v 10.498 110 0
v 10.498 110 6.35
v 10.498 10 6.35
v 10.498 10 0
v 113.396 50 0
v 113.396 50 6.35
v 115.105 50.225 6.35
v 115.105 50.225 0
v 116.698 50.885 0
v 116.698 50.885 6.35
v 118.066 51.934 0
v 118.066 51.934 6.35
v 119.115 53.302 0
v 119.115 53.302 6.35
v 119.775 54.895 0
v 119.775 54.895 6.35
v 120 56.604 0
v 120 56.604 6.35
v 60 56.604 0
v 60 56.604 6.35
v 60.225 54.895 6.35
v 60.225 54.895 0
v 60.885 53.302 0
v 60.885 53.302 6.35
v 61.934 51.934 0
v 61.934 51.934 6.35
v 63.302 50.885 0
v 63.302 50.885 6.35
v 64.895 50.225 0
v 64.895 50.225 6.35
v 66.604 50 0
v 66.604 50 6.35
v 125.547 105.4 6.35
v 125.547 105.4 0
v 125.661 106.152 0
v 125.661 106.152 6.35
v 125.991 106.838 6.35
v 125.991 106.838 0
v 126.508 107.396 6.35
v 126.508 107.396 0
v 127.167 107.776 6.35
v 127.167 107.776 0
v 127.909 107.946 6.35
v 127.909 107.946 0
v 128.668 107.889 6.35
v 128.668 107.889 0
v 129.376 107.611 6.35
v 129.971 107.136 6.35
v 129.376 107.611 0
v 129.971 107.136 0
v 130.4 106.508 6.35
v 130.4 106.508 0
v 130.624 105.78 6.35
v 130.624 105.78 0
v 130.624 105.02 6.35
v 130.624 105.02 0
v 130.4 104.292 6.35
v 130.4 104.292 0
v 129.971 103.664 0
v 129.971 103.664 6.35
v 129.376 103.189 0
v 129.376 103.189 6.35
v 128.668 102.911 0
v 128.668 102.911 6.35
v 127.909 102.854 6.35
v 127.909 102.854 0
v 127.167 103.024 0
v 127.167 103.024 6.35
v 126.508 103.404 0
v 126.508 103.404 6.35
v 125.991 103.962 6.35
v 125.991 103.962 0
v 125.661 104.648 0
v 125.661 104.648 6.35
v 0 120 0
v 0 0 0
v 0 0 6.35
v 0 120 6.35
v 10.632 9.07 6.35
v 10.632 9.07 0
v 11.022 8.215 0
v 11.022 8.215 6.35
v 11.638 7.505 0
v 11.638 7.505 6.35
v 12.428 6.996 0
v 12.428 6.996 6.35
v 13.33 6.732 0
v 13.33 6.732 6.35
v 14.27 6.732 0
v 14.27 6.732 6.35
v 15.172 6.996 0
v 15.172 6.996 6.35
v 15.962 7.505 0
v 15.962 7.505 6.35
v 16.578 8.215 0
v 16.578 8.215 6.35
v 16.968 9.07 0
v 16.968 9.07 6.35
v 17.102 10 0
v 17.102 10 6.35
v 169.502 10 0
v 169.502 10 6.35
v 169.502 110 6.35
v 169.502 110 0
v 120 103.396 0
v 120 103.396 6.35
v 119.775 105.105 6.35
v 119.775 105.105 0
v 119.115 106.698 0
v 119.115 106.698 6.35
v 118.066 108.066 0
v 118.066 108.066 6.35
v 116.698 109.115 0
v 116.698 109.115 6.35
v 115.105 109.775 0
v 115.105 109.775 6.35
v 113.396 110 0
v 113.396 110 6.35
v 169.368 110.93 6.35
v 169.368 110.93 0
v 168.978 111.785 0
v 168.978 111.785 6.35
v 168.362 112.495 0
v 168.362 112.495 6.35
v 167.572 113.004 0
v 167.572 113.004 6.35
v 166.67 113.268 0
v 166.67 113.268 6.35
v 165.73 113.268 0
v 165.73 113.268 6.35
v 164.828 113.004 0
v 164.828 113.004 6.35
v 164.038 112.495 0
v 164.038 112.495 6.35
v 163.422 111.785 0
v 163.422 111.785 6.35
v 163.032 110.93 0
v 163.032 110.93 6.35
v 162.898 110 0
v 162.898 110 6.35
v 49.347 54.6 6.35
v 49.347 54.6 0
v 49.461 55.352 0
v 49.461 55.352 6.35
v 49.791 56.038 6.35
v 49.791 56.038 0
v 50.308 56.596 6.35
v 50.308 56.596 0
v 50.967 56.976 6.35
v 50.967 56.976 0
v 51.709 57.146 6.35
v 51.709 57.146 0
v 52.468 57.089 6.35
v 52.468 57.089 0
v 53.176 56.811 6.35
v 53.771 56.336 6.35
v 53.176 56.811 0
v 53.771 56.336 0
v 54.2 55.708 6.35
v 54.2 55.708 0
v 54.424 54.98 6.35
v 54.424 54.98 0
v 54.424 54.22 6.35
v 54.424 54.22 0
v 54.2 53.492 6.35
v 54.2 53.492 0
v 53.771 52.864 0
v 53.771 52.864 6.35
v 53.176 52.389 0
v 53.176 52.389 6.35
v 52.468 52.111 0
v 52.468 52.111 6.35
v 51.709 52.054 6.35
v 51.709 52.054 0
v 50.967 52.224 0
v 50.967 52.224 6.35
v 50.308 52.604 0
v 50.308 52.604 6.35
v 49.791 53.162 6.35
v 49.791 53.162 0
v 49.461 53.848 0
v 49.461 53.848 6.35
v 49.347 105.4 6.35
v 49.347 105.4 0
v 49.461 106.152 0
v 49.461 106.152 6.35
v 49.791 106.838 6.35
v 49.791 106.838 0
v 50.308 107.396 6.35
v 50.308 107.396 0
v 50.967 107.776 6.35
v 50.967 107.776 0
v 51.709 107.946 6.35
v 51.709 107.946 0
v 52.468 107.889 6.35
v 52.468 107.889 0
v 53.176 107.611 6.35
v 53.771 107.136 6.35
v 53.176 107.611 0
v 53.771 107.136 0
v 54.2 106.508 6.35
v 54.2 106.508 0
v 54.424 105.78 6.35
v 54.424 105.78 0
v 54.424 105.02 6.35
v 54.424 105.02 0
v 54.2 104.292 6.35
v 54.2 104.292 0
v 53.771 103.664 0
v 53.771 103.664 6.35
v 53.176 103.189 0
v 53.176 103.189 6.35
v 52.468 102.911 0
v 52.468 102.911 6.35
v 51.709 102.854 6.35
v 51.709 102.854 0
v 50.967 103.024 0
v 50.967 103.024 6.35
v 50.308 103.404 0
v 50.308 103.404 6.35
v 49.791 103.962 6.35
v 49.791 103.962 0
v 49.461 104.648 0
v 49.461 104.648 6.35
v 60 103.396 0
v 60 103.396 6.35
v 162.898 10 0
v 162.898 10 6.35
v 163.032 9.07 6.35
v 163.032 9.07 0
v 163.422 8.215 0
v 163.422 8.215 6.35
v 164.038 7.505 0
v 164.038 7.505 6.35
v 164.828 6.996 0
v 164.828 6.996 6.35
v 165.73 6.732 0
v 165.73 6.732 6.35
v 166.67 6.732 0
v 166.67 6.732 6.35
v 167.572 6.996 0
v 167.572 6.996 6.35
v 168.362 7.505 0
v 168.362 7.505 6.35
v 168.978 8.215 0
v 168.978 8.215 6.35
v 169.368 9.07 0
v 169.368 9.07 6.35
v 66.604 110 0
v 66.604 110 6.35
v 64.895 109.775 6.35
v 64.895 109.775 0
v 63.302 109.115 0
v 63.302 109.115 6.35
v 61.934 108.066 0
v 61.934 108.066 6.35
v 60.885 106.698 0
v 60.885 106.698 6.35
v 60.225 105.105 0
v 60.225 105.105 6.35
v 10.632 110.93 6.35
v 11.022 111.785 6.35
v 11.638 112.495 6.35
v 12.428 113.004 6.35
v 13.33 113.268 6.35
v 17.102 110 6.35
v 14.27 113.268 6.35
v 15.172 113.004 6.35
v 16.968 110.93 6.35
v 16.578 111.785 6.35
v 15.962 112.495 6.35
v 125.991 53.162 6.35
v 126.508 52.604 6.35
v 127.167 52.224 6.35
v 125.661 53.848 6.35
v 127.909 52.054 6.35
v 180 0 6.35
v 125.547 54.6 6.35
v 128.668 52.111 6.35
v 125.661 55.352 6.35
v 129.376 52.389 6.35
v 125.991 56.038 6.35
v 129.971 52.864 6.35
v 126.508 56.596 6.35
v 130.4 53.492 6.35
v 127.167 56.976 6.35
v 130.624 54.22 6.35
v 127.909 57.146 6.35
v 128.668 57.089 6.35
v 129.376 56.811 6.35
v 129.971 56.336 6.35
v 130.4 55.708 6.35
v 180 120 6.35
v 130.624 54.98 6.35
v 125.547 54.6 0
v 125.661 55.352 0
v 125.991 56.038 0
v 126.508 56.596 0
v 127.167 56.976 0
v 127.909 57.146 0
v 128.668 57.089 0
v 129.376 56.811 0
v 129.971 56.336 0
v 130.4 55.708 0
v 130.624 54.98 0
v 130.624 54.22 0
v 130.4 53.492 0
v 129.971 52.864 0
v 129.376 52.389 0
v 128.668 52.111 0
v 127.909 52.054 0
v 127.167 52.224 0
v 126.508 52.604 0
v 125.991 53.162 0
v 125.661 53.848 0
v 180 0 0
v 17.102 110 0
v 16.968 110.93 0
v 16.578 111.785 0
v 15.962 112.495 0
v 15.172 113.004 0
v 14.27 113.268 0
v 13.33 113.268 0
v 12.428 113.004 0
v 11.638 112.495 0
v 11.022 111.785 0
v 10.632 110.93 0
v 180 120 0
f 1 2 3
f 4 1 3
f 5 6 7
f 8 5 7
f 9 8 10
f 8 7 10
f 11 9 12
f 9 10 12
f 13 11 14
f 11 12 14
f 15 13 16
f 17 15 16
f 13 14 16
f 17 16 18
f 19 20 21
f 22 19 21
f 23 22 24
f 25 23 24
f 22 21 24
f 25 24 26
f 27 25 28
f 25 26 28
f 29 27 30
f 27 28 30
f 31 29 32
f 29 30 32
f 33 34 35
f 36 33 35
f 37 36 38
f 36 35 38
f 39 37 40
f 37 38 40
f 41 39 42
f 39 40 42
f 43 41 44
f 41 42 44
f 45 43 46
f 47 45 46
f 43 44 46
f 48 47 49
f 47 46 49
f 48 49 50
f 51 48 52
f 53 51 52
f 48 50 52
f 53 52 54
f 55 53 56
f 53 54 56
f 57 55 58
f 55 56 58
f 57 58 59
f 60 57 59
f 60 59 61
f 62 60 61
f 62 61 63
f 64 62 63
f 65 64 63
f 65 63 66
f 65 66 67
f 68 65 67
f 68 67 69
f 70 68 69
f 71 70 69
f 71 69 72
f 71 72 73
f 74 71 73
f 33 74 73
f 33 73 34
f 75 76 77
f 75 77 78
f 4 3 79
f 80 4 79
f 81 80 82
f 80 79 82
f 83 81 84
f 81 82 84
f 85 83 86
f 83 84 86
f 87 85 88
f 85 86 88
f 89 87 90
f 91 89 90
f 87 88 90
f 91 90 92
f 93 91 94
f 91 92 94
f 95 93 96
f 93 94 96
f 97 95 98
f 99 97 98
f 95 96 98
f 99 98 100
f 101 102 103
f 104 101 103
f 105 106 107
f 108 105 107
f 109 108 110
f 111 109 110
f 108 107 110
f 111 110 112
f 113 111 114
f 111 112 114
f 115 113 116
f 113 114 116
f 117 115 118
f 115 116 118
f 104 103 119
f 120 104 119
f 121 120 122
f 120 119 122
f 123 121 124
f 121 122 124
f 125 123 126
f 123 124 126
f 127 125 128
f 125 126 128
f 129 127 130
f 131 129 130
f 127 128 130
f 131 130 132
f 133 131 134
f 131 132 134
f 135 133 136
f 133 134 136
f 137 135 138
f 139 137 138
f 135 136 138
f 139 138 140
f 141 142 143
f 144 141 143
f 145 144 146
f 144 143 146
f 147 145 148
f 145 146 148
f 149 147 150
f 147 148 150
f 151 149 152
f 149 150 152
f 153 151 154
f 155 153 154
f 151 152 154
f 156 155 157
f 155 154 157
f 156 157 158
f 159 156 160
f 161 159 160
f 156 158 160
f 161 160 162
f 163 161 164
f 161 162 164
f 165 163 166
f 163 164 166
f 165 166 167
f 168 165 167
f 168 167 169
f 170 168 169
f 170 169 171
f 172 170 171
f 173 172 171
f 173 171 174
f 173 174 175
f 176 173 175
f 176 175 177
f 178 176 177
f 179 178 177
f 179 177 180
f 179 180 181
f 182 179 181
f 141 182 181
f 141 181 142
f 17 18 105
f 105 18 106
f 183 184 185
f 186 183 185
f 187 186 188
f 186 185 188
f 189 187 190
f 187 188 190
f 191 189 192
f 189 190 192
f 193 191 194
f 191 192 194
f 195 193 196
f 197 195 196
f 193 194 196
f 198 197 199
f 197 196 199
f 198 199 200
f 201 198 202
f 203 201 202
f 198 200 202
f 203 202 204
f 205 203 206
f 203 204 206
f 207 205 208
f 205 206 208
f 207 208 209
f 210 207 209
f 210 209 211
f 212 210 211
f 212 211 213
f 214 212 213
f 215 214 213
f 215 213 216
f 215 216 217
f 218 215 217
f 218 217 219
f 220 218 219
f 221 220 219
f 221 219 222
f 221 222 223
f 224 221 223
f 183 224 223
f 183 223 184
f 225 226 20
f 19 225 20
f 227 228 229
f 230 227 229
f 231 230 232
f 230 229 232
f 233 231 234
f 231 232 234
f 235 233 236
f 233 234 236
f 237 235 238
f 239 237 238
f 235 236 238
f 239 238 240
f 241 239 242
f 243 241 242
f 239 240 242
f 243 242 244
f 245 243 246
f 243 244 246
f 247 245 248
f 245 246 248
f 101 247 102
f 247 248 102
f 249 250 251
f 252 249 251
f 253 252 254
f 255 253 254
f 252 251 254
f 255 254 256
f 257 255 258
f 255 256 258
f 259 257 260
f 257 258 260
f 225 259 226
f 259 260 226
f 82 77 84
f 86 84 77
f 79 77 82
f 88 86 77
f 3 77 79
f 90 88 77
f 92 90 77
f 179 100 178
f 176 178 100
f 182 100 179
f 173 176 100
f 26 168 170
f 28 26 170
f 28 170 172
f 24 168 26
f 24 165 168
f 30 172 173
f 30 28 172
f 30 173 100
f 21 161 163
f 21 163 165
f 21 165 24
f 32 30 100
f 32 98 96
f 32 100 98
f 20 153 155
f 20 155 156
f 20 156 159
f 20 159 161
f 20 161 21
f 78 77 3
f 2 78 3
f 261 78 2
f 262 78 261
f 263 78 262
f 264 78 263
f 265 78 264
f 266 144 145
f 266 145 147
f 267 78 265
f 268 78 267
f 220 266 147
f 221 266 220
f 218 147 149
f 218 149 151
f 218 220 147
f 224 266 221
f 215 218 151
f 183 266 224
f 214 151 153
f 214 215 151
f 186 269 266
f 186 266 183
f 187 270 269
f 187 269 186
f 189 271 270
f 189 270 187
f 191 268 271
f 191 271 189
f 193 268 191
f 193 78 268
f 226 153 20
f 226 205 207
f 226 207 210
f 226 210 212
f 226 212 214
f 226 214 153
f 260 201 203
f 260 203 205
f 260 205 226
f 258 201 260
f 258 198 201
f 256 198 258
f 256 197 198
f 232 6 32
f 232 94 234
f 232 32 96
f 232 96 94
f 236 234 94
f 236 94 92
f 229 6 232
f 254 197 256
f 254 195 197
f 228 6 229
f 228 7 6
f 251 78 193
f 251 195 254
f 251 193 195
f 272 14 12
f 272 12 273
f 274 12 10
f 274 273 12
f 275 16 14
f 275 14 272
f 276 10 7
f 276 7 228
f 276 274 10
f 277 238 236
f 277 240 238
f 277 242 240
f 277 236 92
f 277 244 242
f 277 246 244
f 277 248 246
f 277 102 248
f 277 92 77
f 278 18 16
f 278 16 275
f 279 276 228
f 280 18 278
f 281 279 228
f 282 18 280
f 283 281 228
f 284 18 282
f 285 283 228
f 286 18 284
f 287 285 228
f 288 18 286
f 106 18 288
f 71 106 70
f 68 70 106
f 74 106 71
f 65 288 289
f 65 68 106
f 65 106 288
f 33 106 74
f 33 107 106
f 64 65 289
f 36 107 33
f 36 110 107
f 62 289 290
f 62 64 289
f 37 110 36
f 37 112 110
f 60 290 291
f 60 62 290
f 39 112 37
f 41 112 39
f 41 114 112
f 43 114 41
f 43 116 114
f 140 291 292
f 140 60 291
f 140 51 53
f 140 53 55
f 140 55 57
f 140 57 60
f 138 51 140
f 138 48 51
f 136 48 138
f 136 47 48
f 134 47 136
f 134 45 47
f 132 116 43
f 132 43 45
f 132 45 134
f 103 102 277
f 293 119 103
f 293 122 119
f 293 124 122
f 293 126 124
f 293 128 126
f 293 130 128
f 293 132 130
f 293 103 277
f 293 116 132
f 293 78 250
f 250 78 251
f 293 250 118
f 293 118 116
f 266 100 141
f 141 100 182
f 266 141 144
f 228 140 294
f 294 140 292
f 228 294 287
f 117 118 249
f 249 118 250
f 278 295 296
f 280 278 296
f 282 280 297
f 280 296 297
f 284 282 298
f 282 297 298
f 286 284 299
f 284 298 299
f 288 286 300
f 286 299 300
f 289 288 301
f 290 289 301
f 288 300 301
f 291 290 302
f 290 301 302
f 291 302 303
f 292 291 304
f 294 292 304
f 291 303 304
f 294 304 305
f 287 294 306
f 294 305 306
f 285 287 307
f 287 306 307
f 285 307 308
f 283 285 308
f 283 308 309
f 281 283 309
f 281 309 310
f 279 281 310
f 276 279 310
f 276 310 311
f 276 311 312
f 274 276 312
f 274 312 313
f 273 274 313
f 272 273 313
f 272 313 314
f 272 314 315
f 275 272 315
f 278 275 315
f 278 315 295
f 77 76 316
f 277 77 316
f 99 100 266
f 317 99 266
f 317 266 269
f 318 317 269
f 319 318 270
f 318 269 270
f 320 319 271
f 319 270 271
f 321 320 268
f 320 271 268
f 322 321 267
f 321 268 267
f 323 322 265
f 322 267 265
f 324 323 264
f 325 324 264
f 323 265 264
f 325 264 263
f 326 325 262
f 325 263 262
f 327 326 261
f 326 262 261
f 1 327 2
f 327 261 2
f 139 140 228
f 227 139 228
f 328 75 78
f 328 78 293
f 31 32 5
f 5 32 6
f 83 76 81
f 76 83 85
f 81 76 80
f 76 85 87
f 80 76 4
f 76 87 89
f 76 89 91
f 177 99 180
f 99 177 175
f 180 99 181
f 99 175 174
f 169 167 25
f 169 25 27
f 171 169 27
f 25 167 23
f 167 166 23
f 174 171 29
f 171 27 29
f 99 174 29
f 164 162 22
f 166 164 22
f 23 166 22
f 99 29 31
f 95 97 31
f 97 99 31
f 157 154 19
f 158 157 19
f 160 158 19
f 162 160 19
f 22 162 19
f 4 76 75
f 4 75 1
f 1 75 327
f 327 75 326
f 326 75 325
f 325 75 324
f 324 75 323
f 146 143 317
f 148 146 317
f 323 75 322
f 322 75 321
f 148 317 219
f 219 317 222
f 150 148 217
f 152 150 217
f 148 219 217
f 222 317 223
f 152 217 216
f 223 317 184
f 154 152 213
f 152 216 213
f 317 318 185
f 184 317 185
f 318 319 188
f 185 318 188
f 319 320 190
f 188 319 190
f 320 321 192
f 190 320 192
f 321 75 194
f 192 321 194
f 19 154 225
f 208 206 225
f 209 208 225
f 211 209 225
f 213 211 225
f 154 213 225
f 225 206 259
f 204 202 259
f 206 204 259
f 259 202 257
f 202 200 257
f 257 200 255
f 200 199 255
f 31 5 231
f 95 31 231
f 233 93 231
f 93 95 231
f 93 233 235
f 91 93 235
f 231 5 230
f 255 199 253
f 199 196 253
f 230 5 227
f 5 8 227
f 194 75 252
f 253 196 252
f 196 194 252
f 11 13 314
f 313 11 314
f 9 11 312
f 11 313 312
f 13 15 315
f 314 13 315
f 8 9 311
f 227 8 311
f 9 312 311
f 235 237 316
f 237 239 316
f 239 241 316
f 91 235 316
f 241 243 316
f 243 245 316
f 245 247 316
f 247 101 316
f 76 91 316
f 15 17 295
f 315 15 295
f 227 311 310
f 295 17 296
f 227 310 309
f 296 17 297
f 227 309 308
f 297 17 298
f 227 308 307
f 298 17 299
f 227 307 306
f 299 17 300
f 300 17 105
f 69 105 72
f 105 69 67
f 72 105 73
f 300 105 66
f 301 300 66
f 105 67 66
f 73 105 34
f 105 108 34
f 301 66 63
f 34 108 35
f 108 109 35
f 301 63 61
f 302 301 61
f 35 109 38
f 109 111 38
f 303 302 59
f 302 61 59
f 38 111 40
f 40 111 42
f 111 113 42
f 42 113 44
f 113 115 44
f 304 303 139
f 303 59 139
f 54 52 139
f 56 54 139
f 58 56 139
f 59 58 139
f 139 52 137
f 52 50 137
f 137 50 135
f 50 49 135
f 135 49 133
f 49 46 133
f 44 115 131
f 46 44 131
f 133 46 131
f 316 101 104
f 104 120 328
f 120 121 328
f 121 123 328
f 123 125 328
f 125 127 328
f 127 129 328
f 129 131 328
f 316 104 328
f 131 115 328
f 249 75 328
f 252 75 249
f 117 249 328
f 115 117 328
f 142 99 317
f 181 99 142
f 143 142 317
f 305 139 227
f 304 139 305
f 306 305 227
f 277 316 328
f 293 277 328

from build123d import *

# Parameters (mm, degrees)
F0_W     = 180
F0_H     = 120
F1_DEPTH = 6.35
F3_DEPTH = 6.351
F4_W     = 30
F4_H     = 20
F5_DEPTH = 6.351
F7_D     = 5.1054


with BuildPart() as f1:
    # F0 (on Top) → F1 (new body)
    with BuildSketch(Plane.XY):
        with Locations((90, 60)):
            Rectangle(F0_W, F0_H)
    extrude(amount=F1_DEPTH)

    # F2 (on face) → F3 (cut, through all)
    with BuildSketch(Plane.XY.offset(6.35)):
        with BuildLine():
            Line((10.498, 110), (10.498, 60))
            Line((10.498, 60), (13.8, 60))
            Line((13.8, 60), (17.102, 60))
            Line((17.102, 60), (17.102, 110))
            ThreePointArc((17.102, 110), (13.8, 113.302), (10.498, 110))
        make_face()
        with BuildLine():
            Line((162.898, 110), (162.898, 60))
            Line((162.898, 60), (166.2, 60))
            Line((166.2, 60), (169.502, 60))
            Line((169.502, 60), (169.502, 110))
            ThreePointArc((169.502, 110), (166.2, 113.302), (162.898, 110))
        make_face()
        with BuildLine():
            Line((166.2, 60), (162.898, 60))
            Line((162.898, 60), (162.898, 10))
            ThreePointArc((162.898, 10), (166.2, 6.698), (169.502, 10))
            Line((169.502, 10), (169.502, 60))
            Line((169.502, 60), (166.2, 60))
        make_face()
        with BuildLine():
            Line((13.8, 60), (10.498, 60))
            Line((10.498, 60), (10.498, 10))
            ThreePointArc((10.498, 10), (13.8, 6.698), (17.102, 10))
            Line((17.102, 10), (17.102, 60))
            Line((17.102, 60), (13.8, 60))
        make_face()
    extrude(amount=-F3_DEPTH, mode=Mode.SUBTRACT)

    # F4 (on face) → F5 (cut, through all)
    with BuildSketch(Plane.XY.offset(6.35)):
        with BuildLine():
            Line((113.396, 110), (90, 110))
            Line((90, 110), (90, 80))
            Line((90, 80), (120, 80))
            Line((120, 80), (120, 103.396))
            ThreePointArc((120, 103.396), (118.065733183, 108.065733183), (113.396, 110))
        make_face()
        with BuildLine():
            Line((90, 80), (90, 110))
            Line((90, 110), (66.604, 110))
            ThreePointArc((66.604, 110), (61.934266817, 108.065733183), (60, 103.396))
            Line((60, 103.396), (60, 80))
            Line((60, 80), (90, 80))
        make_face()
        with Locations((105, 70)):
            Rectangle(F4_W, F4_H)
        with Locations((75, 70)):
            Rectangle(F4_W, F4_H)
        with BuildLine():
            Line((120, 60), (90, 60))
            Line((90, 60), (90, 50))
            Line((90, 50), (113.396, 50))
            ThreePointArc((113.396, 50), (118.065733183, 51.934266817), (120, 56.604))
            Line((120, 56.604), (120, 60))
        make_face()
        with BuildLine():
            Line((90, 50), (90, 60))
            Line((90, 60), (60, 60))
            Line((60, 60), (60, 56.604))
            ThreePointArc((60, 56.604), (61.934266817, 51.934266817), (66.604, 50))
            Line((66.604, 50), (90, 50))
        make_face()
    extrude(amount=-F5_DEPTH, mode=Mode.SUBTRACT)

    # F7 (through all)
    with Locations(Plane.XY.offset(6.35)):
        with Locations((51.9, 105.4), (128.1, 105.4), (128.1, 54.6), (51.9, 54.6)):
            Hole(F7_D / 2)


solid = f1.part
